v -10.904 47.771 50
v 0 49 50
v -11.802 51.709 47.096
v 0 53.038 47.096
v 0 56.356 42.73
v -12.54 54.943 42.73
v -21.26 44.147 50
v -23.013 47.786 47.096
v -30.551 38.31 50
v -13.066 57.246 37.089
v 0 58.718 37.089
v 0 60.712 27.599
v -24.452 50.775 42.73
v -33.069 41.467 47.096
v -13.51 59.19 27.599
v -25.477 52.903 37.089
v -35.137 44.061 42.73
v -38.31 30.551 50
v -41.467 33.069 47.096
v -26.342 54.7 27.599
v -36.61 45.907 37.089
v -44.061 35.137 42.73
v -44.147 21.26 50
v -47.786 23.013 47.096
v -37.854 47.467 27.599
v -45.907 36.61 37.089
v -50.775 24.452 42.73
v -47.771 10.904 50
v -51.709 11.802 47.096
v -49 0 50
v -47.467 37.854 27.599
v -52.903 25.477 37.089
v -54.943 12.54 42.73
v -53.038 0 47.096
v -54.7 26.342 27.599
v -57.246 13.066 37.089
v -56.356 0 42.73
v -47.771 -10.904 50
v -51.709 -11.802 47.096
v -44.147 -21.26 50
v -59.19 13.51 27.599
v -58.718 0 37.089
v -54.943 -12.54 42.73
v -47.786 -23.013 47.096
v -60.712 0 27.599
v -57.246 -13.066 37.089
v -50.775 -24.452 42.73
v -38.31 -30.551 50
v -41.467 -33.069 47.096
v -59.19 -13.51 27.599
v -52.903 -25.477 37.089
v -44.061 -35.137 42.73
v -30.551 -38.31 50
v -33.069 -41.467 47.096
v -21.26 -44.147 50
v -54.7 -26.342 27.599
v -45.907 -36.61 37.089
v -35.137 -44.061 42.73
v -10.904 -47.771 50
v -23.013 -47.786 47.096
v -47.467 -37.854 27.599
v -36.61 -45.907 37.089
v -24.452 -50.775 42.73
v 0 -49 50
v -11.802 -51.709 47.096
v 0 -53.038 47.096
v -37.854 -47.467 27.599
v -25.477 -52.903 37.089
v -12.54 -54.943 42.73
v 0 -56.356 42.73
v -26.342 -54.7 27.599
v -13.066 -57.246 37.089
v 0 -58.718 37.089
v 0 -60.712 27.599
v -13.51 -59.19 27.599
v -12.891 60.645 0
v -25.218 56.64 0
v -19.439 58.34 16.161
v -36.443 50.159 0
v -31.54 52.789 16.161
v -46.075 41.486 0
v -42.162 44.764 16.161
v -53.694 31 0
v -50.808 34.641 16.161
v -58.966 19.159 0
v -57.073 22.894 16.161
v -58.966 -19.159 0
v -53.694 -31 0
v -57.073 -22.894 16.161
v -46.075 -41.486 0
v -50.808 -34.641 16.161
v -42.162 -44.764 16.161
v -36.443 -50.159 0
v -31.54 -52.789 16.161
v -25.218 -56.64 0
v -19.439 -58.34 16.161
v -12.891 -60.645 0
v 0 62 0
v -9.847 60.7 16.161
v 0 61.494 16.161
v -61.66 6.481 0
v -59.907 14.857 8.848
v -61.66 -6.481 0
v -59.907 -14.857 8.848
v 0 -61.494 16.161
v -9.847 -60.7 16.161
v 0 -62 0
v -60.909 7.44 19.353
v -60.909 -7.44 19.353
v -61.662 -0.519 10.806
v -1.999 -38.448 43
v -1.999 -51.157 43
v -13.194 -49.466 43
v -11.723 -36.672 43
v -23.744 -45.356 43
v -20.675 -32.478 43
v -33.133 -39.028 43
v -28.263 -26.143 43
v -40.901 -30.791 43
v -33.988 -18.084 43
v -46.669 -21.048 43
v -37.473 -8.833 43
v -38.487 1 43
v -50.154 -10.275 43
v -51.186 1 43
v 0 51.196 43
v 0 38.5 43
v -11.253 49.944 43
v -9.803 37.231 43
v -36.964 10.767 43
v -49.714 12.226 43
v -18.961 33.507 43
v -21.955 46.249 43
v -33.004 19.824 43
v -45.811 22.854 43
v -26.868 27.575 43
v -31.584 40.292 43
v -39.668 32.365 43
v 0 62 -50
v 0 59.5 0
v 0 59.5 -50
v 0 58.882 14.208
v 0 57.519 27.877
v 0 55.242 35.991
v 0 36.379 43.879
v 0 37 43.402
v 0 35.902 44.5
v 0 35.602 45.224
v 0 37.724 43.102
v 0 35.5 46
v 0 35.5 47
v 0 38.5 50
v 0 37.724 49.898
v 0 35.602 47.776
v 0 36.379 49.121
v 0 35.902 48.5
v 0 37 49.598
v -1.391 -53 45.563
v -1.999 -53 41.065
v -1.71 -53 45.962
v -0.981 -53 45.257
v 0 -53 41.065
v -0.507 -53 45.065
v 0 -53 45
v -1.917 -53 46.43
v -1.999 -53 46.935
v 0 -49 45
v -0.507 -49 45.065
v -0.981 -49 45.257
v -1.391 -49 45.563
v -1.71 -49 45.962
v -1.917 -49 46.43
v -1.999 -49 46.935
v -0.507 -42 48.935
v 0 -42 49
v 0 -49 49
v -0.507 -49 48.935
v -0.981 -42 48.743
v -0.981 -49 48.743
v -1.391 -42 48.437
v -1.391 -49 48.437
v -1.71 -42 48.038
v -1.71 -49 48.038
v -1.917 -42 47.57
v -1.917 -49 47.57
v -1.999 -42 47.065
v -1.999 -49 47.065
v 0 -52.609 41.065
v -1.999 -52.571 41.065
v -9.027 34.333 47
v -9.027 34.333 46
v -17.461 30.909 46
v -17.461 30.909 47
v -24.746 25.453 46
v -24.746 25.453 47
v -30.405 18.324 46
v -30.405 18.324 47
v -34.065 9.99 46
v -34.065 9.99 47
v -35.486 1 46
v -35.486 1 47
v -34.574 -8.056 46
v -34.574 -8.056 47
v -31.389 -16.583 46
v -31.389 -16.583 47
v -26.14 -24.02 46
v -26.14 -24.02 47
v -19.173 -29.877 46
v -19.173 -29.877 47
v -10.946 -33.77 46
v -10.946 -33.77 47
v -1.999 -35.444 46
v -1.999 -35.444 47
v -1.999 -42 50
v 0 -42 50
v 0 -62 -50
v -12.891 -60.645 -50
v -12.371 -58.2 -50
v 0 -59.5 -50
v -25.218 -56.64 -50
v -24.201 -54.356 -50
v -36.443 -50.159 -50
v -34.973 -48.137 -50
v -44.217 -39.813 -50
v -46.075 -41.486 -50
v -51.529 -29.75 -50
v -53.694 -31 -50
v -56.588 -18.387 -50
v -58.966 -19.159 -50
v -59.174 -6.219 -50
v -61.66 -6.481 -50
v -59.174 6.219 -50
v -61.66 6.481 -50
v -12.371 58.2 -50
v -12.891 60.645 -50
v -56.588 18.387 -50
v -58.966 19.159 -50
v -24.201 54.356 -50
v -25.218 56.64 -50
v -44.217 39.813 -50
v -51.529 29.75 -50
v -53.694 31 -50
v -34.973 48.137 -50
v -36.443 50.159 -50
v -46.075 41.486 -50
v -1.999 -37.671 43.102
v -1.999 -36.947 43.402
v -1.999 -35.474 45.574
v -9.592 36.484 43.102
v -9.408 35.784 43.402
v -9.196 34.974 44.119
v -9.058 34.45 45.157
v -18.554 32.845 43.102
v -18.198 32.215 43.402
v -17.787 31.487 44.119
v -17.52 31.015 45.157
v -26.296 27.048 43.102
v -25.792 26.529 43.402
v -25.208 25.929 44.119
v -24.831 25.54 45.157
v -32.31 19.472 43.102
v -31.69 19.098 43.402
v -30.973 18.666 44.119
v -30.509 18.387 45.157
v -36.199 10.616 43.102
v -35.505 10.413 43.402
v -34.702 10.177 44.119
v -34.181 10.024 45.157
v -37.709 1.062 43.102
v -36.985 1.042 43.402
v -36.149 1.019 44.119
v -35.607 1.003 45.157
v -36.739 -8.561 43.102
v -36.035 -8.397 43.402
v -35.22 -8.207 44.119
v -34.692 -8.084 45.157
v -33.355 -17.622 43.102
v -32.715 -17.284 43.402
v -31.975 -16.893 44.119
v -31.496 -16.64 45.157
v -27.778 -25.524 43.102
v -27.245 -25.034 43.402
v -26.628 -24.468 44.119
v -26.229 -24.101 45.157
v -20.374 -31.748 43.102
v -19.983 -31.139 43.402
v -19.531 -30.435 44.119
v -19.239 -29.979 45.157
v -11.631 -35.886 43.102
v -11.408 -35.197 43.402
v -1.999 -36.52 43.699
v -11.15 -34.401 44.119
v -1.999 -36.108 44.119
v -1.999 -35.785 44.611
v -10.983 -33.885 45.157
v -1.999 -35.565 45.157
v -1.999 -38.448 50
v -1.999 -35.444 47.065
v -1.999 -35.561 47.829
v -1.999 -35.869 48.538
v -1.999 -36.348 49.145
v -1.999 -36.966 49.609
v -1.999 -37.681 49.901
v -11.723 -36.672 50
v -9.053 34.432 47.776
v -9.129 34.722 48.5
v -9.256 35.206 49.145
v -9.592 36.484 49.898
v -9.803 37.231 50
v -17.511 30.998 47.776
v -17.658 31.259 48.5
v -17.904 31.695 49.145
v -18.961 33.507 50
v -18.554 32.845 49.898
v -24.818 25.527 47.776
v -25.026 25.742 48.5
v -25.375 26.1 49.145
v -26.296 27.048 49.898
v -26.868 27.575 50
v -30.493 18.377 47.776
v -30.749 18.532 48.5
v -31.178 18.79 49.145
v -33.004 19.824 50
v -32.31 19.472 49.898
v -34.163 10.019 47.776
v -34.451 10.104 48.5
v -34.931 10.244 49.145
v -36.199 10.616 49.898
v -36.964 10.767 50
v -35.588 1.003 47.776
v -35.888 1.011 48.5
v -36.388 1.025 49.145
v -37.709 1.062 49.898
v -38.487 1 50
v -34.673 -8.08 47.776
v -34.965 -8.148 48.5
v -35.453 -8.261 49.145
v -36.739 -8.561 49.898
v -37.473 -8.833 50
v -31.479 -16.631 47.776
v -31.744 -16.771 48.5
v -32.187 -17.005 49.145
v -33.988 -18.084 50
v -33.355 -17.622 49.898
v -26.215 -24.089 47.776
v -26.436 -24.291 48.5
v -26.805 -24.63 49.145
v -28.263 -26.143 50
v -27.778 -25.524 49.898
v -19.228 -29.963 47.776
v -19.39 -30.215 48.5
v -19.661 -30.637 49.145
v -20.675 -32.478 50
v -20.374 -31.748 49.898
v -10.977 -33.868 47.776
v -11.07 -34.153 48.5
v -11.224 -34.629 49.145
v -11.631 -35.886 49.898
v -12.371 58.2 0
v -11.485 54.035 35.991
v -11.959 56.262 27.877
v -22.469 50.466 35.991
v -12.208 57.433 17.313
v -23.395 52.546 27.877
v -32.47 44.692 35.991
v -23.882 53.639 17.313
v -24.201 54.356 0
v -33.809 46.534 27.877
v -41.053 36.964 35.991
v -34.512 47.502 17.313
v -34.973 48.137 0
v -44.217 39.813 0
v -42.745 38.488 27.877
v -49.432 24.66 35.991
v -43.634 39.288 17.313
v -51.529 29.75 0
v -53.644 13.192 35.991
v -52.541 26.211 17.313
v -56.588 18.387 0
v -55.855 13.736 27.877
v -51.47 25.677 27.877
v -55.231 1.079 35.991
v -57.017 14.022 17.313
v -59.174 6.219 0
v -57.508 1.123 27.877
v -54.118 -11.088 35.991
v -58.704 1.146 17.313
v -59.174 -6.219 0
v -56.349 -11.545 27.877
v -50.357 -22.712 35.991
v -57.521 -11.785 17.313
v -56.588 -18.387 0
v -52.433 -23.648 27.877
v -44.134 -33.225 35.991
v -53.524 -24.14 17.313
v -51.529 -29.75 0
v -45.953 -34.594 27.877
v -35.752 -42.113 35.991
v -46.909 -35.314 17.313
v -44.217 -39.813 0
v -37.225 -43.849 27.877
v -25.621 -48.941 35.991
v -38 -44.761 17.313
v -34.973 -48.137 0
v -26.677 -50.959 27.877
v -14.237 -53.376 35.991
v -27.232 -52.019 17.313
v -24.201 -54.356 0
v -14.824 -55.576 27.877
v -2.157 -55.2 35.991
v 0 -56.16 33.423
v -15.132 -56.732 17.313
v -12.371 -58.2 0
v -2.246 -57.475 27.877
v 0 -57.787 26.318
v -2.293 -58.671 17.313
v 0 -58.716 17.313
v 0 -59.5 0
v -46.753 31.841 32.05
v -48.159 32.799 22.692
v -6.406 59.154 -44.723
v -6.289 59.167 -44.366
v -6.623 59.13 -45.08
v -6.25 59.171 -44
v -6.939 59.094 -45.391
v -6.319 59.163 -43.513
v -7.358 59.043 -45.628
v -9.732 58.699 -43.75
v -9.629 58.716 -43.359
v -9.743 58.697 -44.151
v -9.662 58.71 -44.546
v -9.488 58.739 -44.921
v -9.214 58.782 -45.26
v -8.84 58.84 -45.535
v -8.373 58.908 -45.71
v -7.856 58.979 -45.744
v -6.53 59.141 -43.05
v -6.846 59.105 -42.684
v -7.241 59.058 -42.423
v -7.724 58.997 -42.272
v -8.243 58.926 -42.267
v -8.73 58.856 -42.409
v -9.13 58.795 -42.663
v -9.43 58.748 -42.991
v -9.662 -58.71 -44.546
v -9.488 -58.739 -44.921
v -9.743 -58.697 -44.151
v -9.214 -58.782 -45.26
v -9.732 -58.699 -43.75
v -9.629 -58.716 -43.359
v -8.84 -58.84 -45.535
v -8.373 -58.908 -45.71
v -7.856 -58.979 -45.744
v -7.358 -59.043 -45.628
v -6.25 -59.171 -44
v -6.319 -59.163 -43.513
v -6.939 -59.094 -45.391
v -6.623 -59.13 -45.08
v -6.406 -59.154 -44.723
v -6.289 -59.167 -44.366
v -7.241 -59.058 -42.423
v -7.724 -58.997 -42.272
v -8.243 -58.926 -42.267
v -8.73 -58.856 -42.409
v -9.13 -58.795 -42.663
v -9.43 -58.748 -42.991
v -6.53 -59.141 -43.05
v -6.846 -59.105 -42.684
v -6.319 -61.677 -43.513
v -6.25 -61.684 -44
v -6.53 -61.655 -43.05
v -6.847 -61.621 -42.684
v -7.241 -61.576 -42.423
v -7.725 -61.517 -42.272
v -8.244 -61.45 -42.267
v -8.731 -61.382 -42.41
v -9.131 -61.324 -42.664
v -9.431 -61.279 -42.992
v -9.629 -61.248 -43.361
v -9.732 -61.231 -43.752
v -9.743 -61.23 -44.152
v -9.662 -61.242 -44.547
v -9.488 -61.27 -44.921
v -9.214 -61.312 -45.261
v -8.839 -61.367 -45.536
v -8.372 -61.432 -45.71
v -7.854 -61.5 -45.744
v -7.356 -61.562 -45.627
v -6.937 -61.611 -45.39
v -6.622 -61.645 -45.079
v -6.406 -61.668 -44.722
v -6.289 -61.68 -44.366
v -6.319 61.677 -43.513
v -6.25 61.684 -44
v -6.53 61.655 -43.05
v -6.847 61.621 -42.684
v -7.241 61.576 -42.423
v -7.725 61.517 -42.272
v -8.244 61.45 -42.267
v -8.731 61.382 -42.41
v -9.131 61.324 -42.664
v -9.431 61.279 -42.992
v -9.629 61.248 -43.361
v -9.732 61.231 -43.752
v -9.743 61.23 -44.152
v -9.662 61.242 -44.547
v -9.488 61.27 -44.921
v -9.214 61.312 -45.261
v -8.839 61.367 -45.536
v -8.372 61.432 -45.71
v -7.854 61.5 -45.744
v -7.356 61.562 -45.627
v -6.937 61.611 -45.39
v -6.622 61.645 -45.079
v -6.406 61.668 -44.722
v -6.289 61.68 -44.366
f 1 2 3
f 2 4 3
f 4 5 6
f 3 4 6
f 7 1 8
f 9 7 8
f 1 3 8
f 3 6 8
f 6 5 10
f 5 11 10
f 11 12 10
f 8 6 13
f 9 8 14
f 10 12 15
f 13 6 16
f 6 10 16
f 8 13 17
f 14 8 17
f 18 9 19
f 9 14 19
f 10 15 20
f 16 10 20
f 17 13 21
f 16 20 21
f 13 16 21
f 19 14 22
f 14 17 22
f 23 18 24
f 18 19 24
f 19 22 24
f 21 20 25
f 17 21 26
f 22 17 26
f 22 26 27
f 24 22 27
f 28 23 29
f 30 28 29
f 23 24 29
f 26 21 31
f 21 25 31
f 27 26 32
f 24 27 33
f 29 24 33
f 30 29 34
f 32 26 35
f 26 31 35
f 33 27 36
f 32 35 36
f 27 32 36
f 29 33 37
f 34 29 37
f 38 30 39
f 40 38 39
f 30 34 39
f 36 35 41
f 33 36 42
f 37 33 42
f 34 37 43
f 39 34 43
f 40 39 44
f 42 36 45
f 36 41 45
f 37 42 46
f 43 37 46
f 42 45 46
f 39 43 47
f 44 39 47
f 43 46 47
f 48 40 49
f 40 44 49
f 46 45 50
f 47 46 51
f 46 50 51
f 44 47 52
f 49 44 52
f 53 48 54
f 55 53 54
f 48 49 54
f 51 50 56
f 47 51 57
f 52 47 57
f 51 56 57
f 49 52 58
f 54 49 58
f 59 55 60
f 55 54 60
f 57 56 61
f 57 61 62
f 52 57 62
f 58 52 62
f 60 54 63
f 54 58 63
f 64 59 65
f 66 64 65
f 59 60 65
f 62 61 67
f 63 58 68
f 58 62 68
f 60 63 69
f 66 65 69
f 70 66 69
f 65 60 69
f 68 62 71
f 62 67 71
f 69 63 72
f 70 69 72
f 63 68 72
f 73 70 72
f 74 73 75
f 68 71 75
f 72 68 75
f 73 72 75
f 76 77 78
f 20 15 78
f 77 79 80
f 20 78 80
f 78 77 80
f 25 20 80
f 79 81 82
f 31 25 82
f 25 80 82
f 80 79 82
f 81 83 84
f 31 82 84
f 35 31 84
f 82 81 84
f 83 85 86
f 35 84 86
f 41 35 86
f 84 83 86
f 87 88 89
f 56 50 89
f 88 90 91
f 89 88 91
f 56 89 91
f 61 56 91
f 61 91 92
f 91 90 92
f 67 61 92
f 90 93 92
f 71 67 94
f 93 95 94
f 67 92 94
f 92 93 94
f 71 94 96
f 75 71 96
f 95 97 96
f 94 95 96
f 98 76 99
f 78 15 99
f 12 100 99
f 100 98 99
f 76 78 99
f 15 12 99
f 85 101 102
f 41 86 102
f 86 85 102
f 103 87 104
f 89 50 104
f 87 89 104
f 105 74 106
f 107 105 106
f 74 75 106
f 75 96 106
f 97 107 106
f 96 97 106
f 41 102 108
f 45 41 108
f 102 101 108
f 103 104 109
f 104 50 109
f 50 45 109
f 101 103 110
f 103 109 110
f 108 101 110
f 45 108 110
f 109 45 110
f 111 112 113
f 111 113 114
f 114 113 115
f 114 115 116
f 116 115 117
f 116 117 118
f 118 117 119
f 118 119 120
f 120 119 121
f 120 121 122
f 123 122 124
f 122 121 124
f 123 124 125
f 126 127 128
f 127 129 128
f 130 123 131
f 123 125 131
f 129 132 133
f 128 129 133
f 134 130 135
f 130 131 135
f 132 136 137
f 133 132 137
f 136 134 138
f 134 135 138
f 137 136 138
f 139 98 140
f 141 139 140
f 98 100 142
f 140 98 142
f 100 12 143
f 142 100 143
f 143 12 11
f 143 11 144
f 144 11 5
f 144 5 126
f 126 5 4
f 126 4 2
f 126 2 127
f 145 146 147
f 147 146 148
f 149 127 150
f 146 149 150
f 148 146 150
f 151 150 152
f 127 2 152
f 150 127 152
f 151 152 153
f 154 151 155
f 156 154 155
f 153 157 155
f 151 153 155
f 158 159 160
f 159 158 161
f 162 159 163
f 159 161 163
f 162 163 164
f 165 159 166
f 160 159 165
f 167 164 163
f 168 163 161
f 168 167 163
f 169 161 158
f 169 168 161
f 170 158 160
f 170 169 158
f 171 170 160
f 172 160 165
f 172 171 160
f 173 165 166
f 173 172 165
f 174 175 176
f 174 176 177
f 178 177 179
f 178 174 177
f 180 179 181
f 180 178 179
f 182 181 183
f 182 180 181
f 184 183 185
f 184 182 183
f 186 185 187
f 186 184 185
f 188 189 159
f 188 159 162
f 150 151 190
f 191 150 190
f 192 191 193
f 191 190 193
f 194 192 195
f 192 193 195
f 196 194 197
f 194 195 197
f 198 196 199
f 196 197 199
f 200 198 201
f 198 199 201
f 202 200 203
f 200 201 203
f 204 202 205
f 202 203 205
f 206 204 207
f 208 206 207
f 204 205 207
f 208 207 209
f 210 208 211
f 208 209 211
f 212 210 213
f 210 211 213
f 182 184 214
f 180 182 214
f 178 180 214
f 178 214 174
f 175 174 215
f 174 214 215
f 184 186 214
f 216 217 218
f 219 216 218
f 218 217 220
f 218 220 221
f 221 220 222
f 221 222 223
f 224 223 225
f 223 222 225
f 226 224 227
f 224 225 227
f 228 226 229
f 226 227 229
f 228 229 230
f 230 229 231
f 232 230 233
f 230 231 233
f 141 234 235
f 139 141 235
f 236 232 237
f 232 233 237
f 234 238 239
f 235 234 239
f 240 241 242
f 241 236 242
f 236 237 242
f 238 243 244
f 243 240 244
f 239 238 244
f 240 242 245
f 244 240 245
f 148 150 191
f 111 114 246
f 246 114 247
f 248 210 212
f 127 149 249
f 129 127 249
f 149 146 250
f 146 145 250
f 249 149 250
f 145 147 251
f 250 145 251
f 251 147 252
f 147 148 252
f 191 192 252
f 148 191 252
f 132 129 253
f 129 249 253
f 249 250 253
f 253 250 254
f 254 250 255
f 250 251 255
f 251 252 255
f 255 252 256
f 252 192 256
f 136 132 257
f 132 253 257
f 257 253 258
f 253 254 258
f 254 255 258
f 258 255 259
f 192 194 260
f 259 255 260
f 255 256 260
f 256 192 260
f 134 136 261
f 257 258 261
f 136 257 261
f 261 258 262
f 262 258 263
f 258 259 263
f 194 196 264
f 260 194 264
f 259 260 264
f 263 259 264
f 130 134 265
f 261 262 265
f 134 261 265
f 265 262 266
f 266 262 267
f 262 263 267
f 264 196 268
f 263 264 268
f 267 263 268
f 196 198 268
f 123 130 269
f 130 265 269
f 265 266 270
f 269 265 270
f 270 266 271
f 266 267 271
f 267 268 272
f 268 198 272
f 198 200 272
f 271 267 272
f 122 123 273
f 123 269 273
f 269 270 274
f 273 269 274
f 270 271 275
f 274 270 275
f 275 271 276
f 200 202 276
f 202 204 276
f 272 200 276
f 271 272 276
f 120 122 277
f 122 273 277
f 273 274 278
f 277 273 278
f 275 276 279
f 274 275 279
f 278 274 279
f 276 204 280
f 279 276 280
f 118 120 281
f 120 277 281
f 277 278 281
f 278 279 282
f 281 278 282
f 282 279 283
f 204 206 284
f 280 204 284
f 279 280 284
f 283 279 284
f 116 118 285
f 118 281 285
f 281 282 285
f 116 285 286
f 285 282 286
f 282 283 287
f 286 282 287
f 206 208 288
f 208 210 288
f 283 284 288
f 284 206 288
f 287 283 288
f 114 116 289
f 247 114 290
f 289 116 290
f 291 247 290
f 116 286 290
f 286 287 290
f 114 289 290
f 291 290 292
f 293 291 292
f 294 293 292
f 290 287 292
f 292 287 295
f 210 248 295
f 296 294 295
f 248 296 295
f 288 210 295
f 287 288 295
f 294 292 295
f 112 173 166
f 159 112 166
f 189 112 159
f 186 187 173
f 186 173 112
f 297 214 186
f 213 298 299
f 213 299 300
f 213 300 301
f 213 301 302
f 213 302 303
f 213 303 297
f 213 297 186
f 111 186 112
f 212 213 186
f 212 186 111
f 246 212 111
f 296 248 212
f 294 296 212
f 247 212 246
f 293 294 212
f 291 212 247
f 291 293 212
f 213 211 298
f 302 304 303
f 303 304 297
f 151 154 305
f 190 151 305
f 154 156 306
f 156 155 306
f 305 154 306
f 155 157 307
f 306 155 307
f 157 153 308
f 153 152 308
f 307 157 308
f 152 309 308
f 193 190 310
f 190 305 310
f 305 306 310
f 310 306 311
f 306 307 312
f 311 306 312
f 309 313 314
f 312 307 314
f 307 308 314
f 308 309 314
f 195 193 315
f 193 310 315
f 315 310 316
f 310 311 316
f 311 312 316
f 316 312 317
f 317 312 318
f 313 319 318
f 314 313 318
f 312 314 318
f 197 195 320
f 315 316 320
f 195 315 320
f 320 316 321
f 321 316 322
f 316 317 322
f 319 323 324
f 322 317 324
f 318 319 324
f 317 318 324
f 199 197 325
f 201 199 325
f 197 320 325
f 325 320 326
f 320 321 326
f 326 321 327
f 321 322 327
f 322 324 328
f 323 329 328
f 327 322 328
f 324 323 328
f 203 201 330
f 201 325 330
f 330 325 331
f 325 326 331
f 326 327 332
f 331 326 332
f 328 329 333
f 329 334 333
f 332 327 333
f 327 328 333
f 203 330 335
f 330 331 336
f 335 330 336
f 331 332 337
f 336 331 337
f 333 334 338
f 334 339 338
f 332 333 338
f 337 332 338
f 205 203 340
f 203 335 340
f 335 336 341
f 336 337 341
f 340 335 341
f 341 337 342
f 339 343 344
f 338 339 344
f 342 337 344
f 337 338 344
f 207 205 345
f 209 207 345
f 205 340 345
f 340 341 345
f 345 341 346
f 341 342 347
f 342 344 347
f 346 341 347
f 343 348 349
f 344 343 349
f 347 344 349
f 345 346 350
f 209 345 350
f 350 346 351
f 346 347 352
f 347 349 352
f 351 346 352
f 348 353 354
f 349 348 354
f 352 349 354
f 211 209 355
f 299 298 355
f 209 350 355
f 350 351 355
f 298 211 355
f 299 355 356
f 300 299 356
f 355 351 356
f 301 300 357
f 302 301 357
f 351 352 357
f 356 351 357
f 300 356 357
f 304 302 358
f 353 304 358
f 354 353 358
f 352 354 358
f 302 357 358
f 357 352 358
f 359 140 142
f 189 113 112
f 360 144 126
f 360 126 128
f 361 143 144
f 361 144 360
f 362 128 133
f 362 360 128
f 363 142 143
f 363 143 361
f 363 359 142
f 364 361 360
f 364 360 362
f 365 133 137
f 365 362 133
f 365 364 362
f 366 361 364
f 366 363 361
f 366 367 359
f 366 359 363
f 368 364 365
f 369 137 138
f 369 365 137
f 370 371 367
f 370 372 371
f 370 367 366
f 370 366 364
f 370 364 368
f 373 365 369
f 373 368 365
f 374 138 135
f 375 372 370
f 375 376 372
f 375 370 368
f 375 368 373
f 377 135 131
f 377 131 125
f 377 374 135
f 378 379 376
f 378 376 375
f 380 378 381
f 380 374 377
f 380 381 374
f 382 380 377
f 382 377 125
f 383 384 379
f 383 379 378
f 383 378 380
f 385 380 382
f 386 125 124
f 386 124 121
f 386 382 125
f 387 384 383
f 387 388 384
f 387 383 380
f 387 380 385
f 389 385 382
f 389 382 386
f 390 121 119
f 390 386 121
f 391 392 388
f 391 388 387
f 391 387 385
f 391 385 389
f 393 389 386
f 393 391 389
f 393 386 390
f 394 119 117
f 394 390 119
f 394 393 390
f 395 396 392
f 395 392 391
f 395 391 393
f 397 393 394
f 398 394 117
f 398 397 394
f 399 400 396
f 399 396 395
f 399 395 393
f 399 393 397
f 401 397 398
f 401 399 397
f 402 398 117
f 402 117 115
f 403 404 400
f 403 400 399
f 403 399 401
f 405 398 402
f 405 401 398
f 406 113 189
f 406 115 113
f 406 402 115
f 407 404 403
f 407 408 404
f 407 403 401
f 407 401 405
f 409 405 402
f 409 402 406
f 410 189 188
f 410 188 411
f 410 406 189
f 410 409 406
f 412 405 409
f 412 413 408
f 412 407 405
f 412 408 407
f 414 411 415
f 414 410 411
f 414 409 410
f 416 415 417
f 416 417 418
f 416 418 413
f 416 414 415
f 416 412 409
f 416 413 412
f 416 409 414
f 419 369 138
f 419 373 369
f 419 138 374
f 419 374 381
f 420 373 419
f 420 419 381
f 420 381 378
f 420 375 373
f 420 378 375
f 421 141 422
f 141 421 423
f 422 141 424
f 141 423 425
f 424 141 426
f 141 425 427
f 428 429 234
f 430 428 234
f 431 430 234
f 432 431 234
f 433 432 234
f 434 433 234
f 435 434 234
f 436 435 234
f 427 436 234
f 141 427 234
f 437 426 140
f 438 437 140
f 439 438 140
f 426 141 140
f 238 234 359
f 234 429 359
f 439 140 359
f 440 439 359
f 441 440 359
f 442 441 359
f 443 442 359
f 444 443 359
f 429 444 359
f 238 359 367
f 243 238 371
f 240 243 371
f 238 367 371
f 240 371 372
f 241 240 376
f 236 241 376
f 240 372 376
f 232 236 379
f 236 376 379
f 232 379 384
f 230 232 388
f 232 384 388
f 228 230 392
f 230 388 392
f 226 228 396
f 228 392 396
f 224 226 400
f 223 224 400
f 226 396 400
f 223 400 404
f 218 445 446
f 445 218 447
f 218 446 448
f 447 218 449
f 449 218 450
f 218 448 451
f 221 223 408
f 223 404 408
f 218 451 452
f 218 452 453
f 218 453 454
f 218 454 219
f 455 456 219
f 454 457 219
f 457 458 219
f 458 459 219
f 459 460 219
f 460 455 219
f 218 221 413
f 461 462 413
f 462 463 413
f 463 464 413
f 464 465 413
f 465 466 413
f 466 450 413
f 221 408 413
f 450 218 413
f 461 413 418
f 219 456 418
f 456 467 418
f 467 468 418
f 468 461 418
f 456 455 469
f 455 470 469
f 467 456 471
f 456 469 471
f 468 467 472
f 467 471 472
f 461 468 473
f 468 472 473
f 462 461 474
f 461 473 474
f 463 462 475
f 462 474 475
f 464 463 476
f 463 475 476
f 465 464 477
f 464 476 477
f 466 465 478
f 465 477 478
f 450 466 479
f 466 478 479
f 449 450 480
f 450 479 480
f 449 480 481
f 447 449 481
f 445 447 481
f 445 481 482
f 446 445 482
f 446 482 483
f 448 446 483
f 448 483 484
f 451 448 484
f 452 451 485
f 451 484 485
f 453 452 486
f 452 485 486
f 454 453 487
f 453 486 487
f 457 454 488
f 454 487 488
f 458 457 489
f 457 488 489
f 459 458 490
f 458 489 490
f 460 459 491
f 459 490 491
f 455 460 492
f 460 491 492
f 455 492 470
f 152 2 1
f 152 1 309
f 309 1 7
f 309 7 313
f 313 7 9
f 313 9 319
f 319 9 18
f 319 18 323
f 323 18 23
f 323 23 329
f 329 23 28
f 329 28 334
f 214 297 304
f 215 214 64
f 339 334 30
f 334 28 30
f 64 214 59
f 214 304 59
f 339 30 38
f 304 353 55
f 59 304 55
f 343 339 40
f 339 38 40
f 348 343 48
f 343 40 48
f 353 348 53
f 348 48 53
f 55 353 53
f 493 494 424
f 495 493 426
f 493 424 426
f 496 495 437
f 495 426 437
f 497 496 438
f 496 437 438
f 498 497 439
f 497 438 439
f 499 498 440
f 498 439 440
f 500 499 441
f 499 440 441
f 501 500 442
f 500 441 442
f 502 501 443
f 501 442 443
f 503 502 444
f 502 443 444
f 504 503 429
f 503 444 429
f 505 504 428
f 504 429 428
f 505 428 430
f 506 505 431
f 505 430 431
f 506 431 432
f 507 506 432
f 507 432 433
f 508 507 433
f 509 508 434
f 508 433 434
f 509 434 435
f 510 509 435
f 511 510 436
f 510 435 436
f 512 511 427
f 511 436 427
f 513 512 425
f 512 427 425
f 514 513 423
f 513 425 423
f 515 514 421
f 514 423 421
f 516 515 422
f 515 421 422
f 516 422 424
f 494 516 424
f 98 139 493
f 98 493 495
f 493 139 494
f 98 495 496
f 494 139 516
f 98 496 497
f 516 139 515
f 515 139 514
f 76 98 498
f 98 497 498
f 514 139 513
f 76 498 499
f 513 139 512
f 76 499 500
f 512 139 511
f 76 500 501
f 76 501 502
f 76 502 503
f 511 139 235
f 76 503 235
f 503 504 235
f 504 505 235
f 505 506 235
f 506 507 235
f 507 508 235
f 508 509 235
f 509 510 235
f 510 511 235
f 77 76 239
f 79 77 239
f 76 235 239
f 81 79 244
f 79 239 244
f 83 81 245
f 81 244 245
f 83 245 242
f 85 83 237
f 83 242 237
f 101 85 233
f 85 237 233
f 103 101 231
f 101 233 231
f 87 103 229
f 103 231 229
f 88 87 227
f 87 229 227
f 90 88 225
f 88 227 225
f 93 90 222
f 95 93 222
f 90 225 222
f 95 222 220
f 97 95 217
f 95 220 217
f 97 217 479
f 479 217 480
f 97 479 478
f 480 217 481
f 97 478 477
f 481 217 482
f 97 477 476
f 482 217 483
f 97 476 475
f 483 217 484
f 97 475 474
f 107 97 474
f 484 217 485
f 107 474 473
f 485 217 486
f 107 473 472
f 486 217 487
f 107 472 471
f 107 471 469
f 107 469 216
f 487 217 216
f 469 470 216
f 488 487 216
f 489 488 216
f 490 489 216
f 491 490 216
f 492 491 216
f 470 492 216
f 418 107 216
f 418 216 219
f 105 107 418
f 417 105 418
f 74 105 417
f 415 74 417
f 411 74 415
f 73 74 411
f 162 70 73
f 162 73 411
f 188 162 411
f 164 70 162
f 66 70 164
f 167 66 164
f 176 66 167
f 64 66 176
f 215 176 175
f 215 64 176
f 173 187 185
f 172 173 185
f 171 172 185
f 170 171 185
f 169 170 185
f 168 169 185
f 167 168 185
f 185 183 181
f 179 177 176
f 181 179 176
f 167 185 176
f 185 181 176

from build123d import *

# Parameters (mm, degrees)
F1_ANGLE_BACK = 90
F1_ANGLE      = 180
F3_DEPTH      = 49
F4_DEPTH      = 42
F5_DEPTH      = 53
F6_R          = 1.75
F7_DEPTH      = 62.5


with BuildPart() as f1:
    # F0 (on Front) → F1 (revolve)
    with BuildSketch(Plane.XZ, mode=Mode.PRIVATE) as f1_sk:
        with BuildLine():
            ThreePointArc((-35.5, 47), (-36.3786796564, 49.1213203436), (-38.5, 50))
            Line((-38.5, 50), (-49, 50))
            add(Edge.make_bspline(
                [(-49, 50), (-50.0905438599, 49.4592544488), (-53.0493875637, 47.4989733534), (-57.4486951492, 41.931344871), (-61.5763053799, 28.0443008729), (-61.4881986154, 14.5014666819), (-62, 0)],
                knots=[0, 0, 0, 0, 0.1531073754, 0.3436852098, 0.6019385566, 1, 1, 1, 1], degree=3))
            Line((-62, 0), (-62, -50))
            Line((-62, -50), (-59.5, -50))
            Line((-59.5, -50), (-59.5, 0))
            add(Edge.make_bspline(
                [(-51.1955396277, 43), (-59.7999691963, 32.3488041759), (-58.4857873619, 15.5563373119), (-59.5, 0)],
                knots=[0, 0, 0, 0, 43.7945665817, 43.7945665817, 43.7945665817, 43.7945665817], degree=3))
            Line((-51.1955396277, 43), (-38.5, 43))
            ThreePointArc((-38.5, 43), (-36.3786796564, 43.8786796564), (-35.5, 46))
            Line((-35.5, 46), (-35.5, 47))
        make_face()
    revolve(f1_sk.sketch.rotate(Axis((0, 0, -47.5967168808), (0, 0, 1)), -F1_ANGLE_BACK), axis=Axis((0, 0, -47.5967168808), (0, 0, 1)), revolution_arc=F1_ANGLE)

    # F2 (on Front) → F3 (cut)
    with BuildSketch(Plane.XZ):
        with BuildLine():
            ThreePointArc((0, 45), (1.4142135624, 45.5857864376), (2, 47))
            ThreePointArc((2, 47), (1.4142135624, 48.4142135624), (0, 49))
            ThreePointArc((0, 49), (-1.3909130574, 48.4371363424), (-1.998931704, 47.0653608667))
            Line((-1.998931704, 47.0653608667), (-1.998931704, 46.9346391333))
            ThreePointArc((-1.998931704, 46.9346391333), (-1.3909130574, 45.5628636576), (0, 45))
        make_face()
    extrude(amount=F3_DEPTH, mode=Mode.SUBTRACT)

    # F2 (on Front) → F4 (cut)
    with BuildSketch(Plane.XZ):
        with BuildLine():
            ThreePointArc((-1.998931704, 47.0653608667), (-1.3909130574, 48.4371363424), (0, 49))
            Line((0, 49), (0, 50.3604523001))
            Line((0, 50.3604523001), (-1.998931704, 50.3604523001))
            Line((-1.998931704, 50.3604523001), (-1.998931704, 47.0653608667))
        make_face()
    extrude(amount=F4_DEPTH, mode=Mode.SUBTRACT)

    # F2 (on Front) → F5 (cut)
    with BuildSketch(Plane.XZ):
        with BuildLine():
            Line((0, 41.0653608667), (0, 45))
            ThreePointArc((0, 45), (-1.3909130574, 45.5628636576), (-1.998931704, 46.9346391333))
            Line((-1.998931704, 46.9346391333), (-1.998931704, 41.0653608667))
            Line((-1.998931704, 41.0653608667), (0, 41.0653608667))
        make_face()
    extrude(amount=F5_DEPTH, mode=Mode.SUBTRACT)

    # F6 (on Front) → F7 (cut, symmetric)
    with BuildSketch(Plane.XZ):
        with Locations((-8, -44)):
            Circle(F6_R)
    extrude(amount=F7_DEPTH, both=True, mode=Mode.SUBTRACT)


solid = f1.part
